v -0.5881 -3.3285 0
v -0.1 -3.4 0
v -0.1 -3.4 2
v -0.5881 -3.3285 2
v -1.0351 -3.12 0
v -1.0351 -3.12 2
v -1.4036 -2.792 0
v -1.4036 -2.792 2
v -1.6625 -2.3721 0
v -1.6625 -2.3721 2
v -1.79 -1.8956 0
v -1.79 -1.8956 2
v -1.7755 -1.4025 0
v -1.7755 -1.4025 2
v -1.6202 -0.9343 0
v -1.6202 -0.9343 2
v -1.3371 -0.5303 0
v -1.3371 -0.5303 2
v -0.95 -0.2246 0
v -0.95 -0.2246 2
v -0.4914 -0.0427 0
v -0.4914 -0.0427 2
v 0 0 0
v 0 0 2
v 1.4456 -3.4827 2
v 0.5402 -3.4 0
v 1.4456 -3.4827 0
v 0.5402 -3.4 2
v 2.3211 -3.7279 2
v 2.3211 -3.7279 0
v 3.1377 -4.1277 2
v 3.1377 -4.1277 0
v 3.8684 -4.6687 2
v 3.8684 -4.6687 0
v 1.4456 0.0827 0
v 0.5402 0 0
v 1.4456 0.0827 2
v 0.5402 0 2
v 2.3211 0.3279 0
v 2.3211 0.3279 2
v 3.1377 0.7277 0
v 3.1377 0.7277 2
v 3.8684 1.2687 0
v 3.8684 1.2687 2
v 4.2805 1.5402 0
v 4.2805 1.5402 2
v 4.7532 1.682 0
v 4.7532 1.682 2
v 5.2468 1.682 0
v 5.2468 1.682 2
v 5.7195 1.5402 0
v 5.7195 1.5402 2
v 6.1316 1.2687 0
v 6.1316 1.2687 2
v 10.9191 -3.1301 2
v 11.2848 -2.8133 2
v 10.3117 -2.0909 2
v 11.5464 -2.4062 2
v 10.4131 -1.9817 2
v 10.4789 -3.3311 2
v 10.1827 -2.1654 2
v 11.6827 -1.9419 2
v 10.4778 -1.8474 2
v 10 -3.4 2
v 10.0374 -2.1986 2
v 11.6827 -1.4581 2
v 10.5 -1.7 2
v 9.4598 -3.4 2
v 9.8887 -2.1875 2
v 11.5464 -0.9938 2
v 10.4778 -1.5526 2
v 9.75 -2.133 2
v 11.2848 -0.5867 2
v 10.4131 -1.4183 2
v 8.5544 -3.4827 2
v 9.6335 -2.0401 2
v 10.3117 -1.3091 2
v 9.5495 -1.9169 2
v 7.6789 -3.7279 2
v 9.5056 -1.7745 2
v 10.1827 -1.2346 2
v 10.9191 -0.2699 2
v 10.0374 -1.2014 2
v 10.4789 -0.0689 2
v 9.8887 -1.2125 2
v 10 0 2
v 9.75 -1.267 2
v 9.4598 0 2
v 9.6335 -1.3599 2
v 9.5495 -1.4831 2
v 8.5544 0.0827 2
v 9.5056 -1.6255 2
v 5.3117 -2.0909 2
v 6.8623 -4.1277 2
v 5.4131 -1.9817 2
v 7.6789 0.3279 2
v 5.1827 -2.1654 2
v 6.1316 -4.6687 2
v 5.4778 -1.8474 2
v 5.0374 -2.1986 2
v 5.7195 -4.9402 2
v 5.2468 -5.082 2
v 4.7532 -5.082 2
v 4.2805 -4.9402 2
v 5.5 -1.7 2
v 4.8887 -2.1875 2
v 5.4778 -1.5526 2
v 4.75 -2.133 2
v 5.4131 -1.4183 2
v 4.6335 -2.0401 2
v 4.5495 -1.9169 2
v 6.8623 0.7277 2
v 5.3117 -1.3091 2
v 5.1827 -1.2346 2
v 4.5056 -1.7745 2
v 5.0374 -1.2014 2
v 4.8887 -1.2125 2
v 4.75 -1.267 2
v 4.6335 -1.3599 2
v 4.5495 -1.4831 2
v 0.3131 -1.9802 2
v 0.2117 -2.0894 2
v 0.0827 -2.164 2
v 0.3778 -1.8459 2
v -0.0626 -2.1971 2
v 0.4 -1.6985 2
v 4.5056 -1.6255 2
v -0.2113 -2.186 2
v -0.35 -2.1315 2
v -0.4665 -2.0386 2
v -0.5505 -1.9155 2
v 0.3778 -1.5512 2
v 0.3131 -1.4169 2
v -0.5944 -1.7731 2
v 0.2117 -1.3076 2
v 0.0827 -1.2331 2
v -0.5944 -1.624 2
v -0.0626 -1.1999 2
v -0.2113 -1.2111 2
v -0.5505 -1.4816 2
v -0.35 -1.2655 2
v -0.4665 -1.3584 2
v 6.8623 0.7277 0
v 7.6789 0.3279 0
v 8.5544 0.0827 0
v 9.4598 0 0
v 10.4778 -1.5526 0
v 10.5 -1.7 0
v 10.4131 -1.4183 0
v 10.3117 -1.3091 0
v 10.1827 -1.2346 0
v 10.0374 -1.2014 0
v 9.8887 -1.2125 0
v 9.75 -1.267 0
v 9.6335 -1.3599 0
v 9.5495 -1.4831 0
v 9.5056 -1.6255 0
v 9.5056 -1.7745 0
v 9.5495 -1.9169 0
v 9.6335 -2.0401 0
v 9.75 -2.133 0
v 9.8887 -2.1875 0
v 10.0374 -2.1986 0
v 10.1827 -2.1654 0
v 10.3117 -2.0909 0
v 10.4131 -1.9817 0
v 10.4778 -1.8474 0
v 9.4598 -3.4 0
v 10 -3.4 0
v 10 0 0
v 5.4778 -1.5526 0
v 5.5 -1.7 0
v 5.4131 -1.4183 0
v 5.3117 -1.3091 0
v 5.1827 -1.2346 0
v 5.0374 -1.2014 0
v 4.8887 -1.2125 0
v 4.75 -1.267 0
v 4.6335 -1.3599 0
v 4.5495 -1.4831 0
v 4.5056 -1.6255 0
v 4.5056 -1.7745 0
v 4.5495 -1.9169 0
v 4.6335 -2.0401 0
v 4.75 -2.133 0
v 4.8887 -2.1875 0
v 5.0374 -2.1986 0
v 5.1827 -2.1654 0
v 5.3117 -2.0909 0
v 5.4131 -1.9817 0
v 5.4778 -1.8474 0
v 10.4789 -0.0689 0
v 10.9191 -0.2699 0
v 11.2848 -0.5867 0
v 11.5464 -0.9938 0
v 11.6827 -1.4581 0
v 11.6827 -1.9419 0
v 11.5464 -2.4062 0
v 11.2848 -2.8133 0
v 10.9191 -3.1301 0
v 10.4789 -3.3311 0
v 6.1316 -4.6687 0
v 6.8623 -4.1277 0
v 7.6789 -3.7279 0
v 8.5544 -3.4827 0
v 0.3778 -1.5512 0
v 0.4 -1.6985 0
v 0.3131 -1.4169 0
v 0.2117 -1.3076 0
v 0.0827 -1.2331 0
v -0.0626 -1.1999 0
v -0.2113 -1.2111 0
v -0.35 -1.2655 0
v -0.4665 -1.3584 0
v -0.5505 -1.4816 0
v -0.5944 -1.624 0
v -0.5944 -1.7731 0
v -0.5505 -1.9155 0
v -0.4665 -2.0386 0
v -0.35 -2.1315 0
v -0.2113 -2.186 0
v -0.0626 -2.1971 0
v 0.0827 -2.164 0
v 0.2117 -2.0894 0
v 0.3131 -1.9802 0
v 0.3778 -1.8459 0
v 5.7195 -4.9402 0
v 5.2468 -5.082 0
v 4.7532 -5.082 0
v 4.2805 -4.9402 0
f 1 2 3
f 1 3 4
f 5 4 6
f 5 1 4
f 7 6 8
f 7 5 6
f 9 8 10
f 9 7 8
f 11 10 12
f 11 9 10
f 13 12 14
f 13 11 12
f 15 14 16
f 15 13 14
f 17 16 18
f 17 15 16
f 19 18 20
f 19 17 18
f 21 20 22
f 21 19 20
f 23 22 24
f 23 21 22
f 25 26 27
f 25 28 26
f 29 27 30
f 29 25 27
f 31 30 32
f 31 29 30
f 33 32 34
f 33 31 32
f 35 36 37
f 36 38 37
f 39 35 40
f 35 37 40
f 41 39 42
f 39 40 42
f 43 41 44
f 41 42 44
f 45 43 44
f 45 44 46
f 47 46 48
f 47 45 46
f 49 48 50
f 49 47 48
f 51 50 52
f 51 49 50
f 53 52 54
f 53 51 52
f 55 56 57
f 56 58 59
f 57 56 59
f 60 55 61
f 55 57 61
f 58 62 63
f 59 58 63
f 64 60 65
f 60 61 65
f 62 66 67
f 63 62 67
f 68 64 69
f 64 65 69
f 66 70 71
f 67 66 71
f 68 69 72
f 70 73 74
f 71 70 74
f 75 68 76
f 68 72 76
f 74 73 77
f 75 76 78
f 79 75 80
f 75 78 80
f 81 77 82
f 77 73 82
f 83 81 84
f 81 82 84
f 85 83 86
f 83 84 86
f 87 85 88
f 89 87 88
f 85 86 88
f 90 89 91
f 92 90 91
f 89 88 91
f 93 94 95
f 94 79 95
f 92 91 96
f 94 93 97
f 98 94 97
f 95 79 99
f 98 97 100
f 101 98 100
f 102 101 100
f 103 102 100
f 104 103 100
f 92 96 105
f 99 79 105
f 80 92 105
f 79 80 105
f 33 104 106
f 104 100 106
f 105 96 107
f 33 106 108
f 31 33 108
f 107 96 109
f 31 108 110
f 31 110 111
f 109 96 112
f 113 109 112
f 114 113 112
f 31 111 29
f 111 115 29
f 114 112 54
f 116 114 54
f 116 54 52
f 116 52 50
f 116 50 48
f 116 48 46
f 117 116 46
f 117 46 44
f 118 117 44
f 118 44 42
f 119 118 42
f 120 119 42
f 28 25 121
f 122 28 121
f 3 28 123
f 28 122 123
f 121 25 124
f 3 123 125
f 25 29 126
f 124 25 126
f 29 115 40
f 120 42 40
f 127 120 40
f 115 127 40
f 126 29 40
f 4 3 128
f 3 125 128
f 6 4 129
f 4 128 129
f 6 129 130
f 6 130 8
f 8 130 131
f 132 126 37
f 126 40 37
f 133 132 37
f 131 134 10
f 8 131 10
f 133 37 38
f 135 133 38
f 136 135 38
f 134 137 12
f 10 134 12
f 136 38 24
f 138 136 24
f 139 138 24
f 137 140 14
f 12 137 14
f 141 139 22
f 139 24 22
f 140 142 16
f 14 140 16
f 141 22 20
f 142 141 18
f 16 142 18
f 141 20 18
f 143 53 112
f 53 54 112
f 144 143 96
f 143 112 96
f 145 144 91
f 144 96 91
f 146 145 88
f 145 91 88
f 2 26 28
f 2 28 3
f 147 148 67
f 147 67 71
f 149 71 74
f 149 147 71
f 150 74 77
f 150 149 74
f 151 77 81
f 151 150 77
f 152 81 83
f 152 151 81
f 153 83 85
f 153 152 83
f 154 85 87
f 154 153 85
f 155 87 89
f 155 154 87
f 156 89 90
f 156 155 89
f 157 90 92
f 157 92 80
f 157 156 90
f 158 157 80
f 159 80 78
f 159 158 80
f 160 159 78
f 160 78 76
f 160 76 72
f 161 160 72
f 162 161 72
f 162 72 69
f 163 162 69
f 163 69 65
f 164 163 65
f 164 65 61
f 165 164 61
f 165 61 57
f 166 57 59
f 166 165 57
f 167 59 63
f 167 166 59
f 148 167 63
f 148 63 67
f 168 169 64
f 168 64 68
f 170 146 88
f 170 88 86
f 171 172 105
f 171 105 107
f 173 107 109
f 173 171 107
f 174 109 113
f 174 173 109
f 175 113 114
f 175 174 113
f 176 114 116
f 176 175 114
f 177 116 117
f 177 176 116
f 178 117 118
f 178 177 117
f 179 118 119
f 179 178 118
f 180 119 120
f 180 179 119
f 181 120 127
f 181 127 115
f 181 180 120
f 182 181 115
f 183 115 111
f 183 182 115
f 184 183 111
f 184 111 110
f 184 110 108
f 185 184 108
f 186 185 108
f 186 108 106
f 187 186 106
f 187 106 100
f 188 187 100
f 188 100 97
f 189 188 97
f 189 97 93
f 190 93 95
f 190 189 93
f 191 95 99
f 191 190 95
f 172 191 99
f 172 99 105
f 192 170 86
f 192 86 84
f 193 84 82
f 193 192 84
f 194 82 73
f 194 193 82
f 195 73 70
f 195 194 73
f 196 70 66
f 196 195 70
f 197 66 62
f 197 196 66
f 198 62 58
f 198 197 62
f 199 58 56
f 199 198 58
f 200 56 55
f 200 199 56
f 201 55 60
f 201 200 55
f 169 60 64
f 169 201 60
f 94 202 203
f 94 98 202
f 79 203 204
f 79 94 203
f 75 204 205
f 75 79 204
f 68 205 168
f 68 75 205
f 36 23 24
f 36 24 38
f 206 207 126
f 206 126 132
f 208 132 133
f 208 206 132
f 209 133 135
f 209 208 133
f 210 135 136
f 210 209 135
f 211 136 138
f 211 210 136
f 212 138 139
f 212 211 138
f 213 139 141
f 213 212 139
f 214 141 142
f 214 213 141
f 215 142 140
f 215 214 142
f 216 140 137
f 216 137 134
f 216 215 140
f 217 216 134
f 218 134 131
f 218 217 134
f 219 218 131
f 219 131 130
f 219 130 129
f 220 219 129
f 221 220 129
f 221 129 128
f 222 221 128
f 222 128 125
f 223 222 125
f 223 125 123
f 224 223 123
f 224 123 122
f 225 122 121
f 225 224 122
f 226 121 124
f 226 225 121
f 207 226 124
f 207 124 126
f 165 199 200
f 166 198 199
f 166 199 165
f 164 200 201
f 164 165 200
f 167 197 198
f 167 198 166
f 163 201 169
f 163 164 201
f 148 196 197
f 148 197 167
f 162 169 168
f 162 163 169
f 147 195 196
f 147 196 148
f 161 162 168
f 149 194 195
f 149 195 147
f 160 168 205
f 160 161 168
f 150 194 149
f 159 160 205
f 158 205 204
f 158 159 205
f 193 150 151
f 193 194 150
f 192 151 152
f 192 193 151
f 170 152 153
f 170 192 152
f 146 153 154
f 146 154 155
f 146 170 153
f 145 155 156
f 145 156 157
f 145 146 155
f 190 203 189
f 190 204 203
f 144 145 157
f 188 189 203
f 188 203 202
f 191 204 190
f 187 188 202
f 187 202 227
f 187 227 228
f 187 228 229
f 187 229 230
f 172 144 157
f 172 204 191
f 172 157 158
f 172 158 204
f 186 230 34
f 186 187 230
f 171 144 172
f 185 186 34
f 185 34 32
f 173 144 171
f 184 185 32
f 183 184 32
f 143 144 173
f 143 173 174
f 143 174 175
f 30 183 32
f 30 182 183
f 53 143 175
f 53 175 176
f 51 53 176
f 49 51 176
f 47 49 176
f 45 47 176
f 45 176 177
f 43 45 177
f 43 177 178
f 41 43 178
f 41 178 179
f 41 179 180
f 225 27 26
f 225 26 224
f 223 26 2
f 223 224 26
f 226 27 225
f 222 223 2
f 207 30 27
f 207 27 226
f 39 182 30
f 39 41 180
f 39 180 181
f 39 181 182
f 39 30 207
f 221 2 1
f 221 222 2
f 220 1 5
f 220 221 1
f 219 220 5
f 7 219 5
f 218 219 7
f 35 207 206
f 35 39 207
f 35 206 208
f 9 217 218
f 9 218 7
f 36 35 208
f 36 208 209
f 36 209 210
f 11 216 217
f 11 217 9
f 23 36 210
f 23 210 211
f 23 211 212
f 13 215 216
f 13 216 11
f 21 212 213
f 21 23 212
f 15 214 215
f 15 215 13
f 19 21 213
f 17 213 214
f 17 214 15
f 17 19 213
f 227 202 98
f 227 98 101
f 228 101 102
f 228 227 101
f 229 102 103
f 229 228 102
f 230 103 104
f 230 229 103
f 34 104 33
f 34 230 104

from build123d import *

# Parameters (mm, degrees)
SKETCH1_R           = 0.5
BOSS_EXTRUDE1_DEPTH = 2
FILLET1_R           = 5


with BuildPart() as part:
    # Sketch1 → Boss-Extrude1 (new body)
    with BuildSketch(Plane.XY):
        with BuildLine():
            Line((0, 0), (3.3, 0))
            ThreePointArc((3.3, 0), (5, 1.7), (6.7, 0))
            Line((6.7, 0), (10, 0))
            ThreePointArc((10, 0), (11.7, -1.7), (10, -3.4))
            Line((10, -3.4), (6.7, -3.4))
            ThreePointArc((6.7, -3.4), (5, -5.1), (3.3, -3.4))
            Line((3.3, -3.4), (-0.1, -3.4))
            ThreePointArc((-0.1, -3.4), (-1.800735135, -1.64850779), (0, 0))
        make_face()
        with Locations((-0.1, -1.698529412)):
            Circle(SKETCH1_R, mode=Mode.SUBTRACT)
        with Locations((10, -1.7)):
            Circle(SKETCH1_R, mode=Mode.SUBTRACT)
        with Locations((5, -1.7)):
            Circle(SKETCH1_R, mode=Mode.SUBTRACT)
    extrude(amount=BOSS_EXTRUDE1_DEPTH)

    # Fillet1
    fillet1_edges = [part.edges().sort_by_distance(p)[0] for p in [
        (3.3, 0, 1),
        (6.7, 0, 1),
        (6.7, -3.4, 1),
        (3.3, -3.4, 1),
    ]]
    fillet(fillet1_edges, radius=FILLET1_R)


solid = part.part
